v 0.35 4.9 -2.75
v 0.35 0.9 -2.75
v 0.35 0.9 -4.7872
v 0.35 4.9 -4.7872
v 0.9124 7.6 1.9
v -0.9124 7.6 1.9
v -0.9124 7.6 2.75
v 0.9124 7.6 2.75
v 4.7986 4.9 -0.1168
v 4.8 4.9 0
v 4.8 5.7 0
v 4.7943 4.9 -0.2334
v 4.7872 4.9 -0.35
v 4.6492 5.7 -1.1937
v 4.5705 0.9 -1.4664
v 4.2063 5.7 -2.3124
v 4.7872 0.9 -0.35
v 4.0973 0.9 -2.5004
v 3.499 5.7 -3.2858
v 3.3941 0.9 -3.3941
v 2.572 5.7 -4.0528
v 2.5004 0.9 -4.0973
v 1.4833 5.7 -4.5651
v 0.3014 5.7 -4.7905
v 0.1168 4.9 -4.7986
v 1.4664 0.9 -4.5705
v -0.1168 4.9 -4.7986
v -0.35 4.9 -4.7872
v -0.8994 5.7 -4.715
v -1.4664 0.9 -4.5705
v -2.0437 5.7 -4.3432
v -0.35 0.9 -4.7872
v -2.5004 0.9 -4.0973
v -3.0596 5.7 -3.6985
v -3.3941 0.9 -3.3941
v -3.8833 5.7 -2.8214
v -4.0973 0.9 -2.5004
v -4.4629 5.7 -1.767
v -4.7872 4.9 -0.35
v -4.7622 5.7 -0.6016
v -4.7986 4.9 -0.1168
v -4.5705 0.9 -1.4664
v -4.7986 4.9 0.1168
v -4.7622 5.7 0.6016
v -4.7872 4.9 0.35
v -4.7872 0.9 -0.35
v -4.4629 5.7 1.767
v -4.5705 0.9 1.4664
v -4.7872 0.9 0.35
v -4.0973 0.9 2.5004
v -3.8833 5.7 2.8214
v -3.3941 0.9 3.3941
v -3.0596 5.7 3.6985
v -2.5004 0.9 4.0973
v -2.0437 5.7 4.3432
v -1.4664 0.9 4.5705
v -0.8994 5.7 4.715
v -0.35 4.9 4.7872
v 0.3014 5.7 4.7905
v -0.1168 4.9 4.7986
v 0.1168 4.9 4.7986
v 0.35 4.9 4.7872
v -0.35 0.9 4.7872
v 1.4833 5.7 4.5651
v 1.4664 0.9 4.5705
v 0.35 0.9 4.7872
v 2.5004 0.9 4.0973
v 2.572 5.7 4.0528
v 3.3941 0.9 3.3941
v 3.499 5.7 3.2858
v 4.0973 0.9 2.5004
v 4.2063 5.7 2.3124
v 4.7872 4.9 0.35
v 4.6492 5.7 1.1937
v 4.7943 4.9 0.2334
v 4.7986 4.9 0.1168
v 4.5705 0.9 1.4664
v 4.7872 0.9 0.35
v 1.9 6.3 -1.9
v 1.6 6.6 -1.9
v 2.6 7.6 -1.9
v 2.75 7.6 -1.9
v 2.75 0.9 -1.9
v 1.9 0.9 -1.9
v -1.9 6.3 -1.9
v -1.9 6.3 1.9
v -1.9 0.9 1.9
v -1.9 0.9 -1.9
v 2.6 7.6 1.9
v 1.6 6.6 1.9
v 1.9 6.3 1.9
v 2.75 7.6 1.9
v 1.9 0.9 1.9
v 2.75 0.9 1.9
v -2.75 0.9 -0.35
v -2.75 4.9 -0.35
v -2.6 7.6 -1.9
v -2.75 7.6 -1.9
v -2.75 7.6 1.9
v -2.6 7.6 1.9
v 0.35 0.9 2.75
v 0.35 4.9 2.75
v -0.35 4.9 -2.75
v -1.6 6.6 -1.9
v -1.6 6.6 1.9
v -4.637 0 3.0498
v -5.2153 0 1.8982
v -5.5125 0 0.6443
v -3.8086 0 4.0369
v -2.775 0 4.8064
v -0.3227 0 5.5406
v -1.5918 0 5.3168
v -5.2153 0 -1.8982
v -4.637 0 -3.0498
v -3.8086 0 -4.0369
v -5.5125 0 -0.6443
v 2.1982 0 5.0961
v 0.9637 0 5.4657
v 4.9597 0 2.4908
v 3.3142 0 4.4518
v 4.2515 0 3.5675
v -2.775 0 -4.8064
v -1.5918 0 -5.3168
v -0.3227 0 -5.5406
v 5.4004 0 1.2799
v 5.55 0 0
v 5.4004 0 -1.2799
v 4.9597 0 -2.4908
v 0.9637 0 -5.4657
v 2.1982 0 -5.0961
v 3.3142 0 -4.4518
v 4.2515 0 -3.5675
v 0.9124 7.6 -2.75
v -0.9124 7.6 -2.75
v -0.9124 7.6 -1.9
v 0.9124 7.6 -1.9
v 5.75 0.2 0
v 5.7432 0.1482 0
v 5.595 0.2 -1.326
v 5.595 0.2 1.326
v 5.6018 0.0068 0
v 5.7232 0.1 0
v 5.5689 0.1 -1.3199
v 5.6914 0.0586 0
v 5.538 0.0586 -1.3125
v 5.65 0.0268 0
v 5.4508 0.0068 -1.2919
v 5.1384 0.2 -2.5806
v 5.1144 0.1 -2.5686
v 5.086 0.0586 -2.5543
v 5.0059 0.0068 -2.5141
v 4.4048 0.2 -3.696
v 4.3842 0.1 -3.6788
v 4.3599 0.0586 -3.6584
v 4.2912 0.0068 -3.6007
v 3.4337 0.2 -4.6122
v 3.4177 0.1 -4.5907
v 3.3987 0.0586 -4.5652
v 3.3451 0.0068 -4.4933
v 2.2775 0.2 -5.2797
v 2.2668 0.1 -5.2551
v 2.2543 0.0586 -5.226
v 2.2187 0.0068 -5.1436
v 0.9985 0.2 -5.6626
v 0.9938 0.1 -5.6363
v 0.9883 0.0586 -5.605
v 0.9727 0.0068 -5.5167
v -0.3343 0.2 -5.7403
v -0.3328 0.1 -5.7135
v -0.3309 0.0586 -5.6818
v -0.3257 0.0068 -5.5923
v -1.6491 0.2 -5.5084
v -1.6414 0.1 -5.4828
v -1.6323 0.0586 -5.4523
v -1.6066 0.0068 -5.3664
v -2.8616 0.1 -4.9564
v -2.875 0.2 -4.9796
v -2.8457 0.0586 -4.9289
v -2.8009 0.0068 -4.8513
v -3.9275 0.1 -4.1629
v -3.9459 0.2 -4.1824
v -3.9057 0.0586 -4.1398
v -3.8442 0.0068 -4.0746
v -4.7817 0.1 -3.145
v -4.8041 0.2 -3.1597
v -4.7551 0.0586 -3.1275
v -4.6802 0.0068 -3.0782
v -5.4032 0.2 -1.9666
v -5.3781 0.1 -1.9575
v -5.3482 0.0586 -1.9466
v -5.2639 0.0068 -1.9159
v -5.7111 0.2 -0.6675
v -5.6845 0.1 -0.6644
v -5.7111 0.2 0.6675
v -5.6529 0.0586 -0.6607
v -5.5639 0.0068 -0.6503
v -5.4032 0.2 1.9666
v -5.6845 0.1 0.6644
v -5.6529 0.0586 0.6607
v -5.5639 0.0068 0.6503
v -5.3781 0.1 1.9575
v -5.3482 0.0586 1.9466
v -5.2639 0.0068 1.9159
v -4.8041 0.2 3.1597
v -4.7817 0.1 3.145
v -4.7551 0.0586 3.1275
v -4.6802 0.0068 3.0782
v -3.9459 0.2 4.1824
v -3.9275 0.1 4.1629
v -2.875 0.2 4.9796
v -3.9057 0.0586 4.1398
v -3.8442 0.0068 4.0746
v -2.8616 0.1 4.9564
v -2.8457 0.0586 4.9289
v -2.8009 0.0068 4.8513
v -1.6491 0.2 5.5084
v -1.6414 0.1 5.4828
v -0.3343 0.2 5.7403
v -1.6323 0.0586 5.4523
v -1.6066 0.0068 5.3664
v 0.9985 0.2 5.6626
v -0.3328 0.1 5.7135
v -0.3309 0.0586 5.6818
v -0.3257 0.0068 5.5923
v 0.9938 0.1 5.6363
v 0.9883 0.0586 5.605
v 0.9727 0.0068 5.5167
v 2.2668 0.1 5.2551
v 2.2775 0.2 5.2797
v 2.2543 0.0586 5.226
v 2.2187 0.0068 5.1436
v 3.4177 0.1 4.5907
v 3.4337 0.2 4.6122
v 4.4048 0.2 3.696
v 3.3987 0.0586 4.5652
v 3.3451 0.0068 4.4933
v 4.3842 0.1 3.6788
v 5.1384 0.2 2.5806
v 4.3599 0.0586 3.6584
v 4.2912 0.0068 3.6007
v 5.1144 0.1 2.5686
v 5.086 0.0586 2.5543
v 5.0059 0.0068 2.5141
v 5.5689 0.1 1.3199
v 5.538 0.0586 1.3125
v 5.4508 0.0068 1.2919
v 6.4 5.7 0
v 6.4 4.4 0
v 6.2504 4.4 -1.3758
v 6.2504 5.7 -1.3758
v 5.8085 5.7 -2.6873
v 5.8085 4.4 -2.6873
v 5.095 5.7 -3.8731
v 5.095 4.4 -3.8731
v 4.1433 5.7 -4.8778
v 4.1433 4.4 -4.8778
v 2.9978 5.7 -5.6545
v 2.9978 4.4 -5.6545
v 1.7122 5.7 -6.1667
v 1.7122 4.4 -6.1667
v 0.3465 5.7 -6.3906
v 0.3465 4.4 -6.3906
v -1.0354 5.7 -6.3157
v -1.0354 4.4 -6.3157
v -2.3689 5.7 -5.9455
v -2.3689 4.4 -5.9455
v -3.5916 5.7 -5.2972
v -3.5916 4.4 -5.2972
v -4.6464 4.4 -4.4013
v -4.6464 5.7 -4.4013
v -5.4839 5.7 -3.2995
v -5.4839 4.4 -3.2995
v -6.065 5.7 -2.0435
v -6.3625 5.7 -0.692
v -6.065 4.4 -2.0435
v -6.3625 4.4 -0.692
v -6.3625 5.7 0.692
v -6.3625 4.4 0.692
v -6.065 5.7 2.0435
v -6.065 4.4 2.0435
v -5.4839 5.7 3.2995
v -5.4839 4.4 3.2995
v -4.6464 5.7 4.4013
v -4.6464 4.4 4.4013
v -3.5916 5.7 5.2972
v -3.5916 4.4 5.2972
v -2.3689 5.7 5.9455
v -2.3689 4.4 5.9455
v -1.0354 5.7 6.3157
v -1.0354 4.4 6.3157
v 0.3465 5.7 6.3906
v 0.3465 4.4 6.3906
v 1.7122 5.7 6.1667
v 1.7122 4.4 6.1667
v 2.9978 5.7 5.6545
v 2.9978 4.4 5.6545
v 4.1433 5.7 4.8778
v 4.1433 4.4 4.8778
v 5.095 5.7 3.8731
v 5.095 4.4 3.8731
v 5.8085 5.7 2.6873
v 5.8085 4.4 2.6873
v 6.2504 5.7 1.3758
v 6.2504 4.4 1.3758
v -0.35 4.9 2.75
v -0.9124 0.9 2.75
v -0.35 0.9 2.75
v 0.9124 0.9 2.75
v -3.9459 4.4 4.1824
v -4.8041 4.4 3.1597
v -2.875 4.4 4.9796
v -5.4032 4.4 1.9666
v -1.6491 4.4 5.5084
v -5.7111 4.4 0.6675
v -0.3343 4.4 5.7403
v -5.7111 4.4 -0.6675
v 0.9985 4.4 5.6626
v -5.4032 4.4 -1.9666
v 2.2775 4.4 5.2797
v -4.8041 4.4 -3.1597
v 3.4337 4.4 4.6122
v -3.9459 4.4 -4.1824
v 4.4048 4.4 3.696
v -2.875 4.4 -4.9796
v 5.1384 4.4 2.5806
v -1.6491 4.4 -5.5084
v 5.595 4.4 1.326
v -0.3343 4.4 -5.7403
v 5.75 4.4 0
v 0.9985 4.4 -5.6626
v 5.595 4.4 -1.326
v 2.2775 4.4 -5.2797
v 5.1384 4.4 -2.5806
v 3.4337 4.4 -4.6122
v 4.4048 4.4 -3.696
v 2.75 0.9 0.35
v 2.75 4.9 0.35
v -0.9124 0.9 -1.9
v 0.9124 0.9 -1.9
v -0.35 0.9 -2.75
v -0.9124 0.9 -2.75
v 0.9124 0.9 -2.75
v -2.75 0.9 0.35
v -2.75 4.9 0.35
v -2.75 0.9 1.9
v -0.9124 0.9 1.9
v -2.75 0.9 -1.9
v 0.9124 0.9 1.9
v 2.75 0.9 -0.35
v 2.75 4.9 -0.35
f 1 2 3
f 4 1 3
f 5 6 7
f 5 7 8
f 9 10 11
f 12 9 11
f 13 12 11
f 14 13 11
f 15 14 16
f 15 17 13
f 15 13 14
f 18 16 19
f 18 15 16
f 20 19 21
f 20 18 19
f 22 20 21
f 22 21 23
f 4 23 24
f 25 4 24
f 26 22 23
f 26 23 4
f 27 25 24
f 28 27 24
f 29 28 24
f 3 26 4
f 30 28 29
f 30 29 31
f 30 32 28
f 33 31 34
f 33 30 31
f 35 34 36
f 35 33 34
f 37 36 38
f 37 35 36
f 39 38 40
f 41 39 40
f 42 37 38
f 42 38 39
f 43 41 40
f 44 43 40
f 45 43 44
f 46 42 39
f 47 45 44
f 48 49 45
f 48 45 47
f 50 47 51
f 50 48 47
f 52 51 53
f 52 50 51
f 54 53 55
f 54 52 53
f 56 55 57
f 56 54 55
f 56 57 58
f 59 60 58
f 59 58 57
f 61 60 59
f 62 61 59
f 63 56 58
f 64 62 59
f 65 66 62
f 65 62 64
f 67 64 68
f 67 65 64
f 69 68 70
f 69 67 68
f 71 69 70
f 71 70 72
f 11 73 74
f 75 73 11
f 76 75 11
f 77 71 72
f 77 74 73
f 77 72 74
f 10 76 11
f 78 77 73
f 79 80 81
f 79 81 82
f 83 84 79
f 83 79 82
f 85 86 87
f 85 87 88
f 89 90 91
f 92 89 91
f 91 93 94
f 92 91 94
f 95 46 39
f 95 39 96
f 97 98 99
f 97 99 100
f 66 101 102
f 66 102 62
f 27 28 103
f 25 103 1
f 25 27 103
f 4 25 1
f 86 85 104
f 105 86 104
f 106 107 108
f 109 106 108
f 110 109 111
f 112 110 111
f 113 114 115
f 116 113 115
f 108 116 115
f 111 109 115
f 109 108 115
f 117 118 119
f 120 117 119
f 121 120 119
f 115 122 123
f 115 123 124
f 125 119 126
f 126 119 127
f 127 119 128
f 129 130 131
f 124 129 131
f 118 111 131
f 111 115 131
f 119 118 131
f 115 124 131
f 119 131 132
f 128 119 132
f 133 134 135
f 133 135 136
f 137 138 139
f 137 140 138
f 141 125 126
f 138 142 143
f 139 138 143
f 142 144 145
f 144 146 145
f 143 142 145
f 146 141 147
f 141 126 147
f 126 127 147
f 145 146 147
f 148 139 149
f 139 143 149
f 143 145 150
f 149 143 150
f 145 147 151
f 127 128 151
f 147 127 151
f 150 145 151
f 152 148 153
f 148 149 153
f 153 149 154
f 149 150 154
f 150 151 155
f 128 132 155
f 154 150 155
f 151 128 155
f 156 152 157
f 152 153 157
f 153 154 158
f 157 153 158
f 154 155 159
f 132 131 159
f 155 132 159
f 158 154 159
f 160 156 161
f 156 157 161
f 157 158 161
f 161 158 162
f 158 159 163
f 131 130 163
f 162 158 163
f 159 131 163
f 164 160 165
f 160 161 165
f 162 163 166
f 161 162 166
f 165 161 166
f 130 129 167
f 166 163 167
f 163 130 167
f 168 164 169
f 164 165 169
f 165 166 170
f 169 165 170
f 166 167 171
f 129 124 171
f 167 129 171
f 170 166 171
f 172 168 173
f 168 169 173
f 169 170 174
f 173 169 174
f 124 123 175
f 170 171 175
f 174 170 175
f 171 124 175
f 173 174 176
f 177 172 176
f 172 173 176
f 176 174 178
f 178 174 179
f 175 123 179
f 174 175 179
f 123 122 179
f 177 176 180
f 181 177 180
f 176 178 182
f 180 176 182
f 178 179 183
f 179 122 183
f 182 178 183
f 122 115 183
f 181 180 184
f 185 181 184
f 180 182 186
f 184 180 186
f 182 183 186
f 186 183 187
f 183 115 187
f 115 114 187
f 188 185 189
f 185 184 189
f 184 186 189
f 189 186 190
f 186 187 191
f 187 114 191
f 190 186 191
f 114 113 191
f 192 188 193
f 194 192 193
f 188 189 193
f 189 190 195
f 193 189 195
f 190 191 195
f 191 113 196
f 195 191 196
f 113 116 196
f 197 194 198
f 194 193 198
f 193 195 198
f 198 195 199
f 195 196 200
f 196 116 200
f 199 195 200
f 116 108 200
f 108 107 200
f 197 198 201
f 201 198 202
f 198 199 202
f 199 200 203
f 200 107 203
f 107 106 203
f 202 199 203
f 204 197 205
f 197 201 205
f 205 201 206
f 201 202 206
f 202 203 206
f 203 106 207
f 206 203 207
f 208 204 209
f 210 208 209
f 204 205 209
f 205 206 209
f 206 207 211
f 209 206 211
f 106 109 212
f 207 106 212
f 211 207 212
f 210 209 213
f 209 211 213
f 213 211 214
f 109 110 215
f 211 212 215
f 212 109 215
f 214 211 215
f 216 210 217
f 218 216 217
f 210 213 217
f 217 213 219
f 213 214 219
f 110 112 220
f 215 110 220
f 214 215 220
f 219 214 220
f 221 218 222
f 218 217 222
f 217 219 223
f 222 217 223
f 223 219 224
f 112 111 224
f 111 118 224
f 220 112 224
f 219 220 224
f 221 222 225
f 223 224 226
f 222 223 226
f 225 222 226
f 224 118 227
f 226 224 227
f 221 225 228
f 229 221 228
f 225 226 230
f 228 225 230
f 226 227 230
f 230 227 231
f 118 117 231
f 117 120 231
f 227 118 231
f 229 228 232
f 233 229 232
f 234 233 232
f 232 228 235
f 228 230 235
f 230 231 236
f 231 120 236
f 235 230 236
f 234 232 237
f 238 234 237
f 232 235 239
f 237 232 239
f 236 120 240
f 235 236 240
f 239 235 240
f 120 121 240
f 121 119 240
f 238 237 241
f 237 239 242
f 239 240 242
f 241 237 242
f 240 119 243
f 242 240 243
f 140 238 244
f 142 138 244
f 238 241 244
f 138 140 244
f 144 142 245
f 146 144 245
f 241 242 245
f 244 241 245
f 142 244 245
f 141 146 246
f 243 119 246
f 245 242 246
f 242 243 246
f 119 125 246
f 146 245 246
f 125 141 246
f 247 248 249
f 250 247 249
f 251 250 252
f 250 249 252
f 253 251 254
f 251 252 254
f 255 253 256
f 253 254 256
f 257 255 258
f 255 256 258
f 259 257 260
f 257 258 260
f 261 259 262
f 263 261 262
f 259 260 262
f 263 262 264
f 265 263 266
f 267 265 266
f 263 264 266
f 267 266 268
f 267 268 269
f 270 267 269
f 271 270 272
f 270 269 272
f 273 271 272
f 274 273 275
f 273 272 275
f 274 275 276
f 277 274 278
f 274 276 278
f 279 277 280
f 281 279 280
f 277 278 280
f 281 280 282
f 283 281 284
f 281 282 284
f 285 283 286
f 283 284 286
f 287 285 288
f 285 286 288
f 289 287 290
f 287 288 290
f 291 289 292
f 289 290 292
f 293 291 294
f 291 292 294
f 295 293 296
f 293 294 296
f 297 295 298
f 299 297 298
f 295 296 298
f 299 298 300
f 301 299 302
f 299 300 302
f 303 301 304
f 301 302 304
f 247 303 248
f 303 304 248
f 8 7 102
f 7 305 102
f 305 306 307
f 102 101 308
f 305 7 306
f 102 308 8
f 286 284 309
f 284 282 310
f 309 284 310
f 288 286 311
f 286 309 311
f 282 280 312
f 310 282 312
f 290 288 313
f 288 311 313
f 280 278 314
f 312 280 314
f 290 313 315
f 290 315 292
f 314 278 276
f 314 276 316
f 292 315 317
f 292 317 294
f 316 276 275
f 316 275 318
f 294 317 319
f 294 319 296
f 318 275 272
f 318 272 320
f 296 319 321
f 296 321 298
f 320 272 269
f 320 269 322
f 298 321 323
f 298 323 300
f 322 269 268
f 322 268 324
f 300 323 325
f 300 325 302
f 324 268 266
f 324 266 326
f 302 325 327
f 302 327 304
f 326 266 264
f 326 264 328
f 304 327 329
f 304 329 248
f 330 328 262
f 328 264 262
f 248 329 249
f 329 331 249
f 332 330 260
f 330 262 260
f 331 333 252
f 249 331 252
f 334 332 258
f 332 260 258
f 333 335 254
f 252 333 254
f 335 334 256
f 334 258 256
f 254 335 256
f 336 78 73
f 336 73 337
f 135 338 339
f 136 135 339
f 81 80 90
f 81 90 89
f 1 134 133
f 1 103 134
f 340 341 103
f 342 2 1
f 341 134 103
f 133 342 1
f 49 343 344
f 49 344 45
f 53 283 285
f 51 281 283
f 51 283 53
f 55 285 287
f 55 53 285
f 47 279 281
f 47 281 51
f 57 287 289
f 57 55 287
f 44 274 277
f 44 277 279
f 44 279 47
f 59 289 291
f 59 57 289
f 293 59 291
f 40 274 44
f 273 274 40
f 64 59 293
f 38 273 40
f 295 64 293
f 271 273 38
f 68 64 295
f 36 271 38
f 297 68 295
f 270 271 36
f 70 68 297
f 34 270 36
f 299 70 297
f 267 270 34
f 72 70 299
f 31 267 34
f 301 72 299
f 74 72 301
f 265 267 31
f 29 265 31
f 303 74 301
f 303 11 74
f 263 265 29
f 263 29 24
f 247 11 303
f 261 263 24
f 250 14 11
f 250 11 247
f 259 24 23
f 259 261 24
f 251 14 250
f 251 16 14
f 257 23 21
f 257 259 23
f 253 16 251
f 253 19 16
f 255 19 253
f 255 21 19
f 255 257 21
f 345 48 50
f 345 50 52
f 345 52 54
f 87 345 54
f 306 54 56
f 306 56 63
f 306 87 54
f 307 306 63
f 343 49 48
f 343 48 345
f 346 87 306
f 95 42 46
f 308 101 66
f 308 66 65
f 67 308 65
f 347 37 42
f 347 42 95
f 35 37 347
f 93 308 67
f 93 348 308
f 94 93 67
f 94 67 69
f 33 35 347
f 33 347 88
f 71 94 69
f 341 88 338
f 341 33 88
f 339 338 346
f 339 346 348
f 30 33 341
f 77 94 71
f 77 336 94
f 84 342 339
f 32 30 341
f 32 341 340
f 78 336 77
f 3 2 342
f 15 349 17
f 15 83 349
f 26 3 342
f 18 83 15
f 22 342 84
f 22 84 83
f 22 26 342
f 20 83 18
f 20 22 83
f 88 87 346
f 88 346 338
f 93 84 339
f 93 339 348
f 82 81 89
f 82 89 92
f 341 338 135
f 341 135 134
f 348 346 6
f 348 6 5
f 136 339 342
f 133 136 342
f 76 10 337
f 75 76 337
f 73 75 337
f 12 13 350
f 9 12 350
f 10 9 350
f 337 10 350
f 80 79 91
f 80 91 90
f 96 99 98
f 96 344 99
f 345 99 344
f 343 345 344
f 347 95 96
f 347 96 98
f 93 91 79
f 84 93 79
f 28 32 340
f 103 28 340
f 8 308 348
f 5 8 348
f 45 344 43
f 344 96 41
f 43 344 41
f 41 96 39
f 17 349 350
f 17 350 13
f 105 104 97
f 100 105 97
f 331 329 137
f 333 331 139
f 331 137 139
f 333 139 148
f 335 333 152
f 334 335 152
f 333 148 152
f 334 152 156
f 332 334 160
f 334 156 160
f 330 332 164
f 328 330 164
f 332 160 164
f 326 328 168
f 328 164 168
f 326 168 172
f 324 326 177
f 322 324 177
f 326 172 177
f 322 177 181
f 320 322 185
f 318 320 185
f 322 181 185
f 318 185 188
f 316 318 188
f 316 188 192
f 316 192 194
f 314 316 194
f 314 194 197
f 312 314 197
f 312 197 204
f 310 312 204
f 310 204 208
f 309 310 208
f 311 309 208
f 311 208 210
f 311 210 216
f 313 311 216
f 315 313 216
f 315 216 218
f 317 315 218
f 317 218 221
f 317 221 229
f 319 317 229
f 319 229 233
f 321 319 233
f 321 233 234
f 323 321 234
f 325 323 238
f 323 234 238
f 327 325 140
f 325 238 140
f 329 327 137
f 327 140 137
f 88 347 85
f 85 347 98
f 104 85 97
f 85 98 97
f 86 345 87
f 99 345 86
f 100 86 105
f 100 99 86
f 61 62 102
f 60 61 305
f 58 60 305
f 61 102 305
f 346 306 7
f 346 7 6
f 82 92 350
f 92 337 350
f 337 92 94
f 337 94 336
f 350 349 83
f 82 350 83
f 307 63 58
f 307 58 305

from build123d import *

# Parameters (mm, degrees)
SKETCH_1_R          = 5.75
EXTRUDE_1_DEPTH     = 0.9
SKETCH_2_R          = 5.75
SKETCH_2_R_2        = 4.8
EXTRUDE_2_DEPTH     = 3.5
SKETCH_3_R          = 6.4
SKETCH_3_R_2        = 4.8
EXTRUDE_3_DEPTH     = 1.3
SKETCH_4_W          = 0.85
SKETCH_4_H          = 3.8
SKETCH_4_W_2        = 1.824882422
SKETCH_4_H_2        = 0.85
EXTRUDE_4_DEPTH     = 6.7
EXTRUDE_5_DEPTH     = 3.8
CUT_EXTRUDE_1_REACH = 10.3
EXTRUDE_6_DEPTH     = 4
FILLET1_R           = 0.2


with BuildPart() as part:
    # Эскиз1 → Бобышка-Вытянуть1 (new body)
    with BuildSketch(Plane(origin=(0, 0, 0), x_dir=(1, 0, 0), z_dir=(0, 1, 0))):
        Circle(SKETCH_1_R)
    extrude(amount=EXTRUDE_1_DEPTH)

    # Эскиз2 → Бобышка-Вытянуть2 (add)
    with BuildSketch(Plane(origin=(0, 0.9, 0), x_dir=(1, 0, 0), z_dir=(0, 1, 0))):
        Circle(SKETCH_2_R)
        Circle(SKETCH_2_R_2, mode=Mode.SUBTRACT)
    extrude(amount=EXTRUDE_2_DEPTH)

    # Эскиз3 → Бобышка-Вытянуть3 (add)
    with BuildSketch(Plane(origin=(0, 4.4, 0), x_dir=(1, 0, 0), z_dir=(0, 1, 0))):
        Circle(SKETCH_3_R)
        Circle(SKETCH_3_R_2, mode=Mode.SUBTRACT)
    extrude(amount=EXTRUDE_3_DEPTH)

    # Эскиз4 → Бобышка-Вытянуть4 (add)
    with BuildSketch(Plane(origin=(0, 0.9, 0), x_dir=(1, 0, 0), z_dir=(0, 1, 0))):
        with Locations((-2.325, 0)):
            Rectangle(SKETCH_4_W, SKETCH_4_H)
        with Locations((2.325, 0)):
            Rectangle(SKETCH_4_W, SKETCH_4_H)
        with Locations((0, 2.325)):
            Rectangle(SKETCH_4_W_2, SKETCH_4_H_2)
        with Locations((0, -2.325)):
            Rectangle(SKETCH_4_W_2, SKETCH_4_H_2)
    extrude(amount=EXTRUDE_4_DEPTH)

    # Эскиз5 → Бобышка-Вытянуть5 (add)
    with BuildSketch(Plane(origin=(0, 0, -1.9), x_dir=(-1, 0, 0), z_dir=(0, 0, -1))):
        Polygon((1.9, 6.3), (1.6, 6.6), (2.6, 7.6), align=None)
        Polygon((-1.9, 6.3), (-1.6, 6.6), (-2.6, 7.6), align=None)
    extrude(amount=-EXTRUDE_5_DEPTH)

    # Эскиз6 → Вырез-Вытянуть1 (cut, up to next)
    with BuildSketch(Plane(origin=(0, 0, -1.9), x_dir=(-1, 0, 0), z_dir=(0, 0, -1)), mode=Mode.PRIVATE) as cut_extrude_1_sk1:
        Polygon((1.9, 6.9), (2.6, 7.6), (1.9, 7.6), align=None)
    cut_extrude_1_tool1 = extrude(cut_extrude_1_sk1.sketch, amount=-CUT_EXTRUDE_1_REACH, mode=Mode.PRIVATE) & part.part
    add(cut_extrude_1_tool1.solids().sort_by_distance((-2.133333, 7.366667, -1.9))[0], mode=Mode.SUBTRACT)
    # Эскиз6 → Вырез-Вытянуть1 (cut, up to next)
    with BuildSketch(Plane(origin=(0, 0, -1.9), x_dir=(-1, 0, 0), z_dir=(0, 0, -1)), mode=Mode.PRIVATE) as cut_extrude_1_sk2:
        Polygon((-1.9, 6.9), (-2.6, 7.6), (-1.9, 7.6), align=None)
    cut_extrude_1_tool2 = extrude(cut_extrude_1_sk2.sketch, amount=-CUT_EXTRUDE_1_REACH, mode=Mode.PRIVATE) & part.part
    add(cut_extrude_1_tool2.solids().sort_by_distance((2.133333, 7.366667, -1.9))[0], mode=Mode.SUBTRACT)

    # Эскиз7 → Бобышка-Вытянуть6 (add)
    with BuildSketch(Plane(origin=(0, 0.9, 0), x_dir=(1, 0, 0), z_dir=(0, 1, 0))):
        with BuildLine():
            Line((-0.35, -2.75), (0.35, -2.75))
            Line((0.35, -2.75), (0.35, -4.787222577))
            ThreePointArc((0.35, -4.787222577), (0, -4.8), (-0.35, -4.787222577))
            Line((-0.35, -4.787222577), (-0.35, -2.75))
        make_face()
        with BuildLine():
            Line((4.787222577, -0.35), (2.75, -0.35))
            Line((2.75, -0.35), (2.75, 0.35))
            Line((2.75, 0.35), (4.787222577, 0.35))
            ThreePointArc((4.787222577, 0.35), (4.8, 0), (4.787222577, -0.35))
        make_face()
        with BuildLine():
            Line((0.35, 2.75), (0.35, 4.787222577))
            ThreePointArc((0.35, 4.787222577), (0, 4.8), (-0.35, 4.787222577))
            Line((-0.35, 4.787222577), (-0.35, 2.75))
            Line((-0.35, 2.75), (0.35, 2.75))
        make_face()
        with BuildLine():
            Line((-2.75, -0.35), (-4.787222577, -0.35))
            ThreePointArc((-4.787222577, -0.35), (-4.8, 0), (-4.787222577, 0.35))
            Line((-4.787222577, 0.35), (-2.75, 0.35))
            Line((-2.75, 0.35), (-2.75, -0.35))
        make_face()
    extrude(amount=EXTRUDE_6_DEPTH)

    # Fillet1
    fillet1_edges = [part.edges().sort_by_distance(p)[0] for p in [
        (-5.75, 0, 0),
    ]]
    fillet(fillet1_edges, radius=FILLET1_R)


solid = part.part
